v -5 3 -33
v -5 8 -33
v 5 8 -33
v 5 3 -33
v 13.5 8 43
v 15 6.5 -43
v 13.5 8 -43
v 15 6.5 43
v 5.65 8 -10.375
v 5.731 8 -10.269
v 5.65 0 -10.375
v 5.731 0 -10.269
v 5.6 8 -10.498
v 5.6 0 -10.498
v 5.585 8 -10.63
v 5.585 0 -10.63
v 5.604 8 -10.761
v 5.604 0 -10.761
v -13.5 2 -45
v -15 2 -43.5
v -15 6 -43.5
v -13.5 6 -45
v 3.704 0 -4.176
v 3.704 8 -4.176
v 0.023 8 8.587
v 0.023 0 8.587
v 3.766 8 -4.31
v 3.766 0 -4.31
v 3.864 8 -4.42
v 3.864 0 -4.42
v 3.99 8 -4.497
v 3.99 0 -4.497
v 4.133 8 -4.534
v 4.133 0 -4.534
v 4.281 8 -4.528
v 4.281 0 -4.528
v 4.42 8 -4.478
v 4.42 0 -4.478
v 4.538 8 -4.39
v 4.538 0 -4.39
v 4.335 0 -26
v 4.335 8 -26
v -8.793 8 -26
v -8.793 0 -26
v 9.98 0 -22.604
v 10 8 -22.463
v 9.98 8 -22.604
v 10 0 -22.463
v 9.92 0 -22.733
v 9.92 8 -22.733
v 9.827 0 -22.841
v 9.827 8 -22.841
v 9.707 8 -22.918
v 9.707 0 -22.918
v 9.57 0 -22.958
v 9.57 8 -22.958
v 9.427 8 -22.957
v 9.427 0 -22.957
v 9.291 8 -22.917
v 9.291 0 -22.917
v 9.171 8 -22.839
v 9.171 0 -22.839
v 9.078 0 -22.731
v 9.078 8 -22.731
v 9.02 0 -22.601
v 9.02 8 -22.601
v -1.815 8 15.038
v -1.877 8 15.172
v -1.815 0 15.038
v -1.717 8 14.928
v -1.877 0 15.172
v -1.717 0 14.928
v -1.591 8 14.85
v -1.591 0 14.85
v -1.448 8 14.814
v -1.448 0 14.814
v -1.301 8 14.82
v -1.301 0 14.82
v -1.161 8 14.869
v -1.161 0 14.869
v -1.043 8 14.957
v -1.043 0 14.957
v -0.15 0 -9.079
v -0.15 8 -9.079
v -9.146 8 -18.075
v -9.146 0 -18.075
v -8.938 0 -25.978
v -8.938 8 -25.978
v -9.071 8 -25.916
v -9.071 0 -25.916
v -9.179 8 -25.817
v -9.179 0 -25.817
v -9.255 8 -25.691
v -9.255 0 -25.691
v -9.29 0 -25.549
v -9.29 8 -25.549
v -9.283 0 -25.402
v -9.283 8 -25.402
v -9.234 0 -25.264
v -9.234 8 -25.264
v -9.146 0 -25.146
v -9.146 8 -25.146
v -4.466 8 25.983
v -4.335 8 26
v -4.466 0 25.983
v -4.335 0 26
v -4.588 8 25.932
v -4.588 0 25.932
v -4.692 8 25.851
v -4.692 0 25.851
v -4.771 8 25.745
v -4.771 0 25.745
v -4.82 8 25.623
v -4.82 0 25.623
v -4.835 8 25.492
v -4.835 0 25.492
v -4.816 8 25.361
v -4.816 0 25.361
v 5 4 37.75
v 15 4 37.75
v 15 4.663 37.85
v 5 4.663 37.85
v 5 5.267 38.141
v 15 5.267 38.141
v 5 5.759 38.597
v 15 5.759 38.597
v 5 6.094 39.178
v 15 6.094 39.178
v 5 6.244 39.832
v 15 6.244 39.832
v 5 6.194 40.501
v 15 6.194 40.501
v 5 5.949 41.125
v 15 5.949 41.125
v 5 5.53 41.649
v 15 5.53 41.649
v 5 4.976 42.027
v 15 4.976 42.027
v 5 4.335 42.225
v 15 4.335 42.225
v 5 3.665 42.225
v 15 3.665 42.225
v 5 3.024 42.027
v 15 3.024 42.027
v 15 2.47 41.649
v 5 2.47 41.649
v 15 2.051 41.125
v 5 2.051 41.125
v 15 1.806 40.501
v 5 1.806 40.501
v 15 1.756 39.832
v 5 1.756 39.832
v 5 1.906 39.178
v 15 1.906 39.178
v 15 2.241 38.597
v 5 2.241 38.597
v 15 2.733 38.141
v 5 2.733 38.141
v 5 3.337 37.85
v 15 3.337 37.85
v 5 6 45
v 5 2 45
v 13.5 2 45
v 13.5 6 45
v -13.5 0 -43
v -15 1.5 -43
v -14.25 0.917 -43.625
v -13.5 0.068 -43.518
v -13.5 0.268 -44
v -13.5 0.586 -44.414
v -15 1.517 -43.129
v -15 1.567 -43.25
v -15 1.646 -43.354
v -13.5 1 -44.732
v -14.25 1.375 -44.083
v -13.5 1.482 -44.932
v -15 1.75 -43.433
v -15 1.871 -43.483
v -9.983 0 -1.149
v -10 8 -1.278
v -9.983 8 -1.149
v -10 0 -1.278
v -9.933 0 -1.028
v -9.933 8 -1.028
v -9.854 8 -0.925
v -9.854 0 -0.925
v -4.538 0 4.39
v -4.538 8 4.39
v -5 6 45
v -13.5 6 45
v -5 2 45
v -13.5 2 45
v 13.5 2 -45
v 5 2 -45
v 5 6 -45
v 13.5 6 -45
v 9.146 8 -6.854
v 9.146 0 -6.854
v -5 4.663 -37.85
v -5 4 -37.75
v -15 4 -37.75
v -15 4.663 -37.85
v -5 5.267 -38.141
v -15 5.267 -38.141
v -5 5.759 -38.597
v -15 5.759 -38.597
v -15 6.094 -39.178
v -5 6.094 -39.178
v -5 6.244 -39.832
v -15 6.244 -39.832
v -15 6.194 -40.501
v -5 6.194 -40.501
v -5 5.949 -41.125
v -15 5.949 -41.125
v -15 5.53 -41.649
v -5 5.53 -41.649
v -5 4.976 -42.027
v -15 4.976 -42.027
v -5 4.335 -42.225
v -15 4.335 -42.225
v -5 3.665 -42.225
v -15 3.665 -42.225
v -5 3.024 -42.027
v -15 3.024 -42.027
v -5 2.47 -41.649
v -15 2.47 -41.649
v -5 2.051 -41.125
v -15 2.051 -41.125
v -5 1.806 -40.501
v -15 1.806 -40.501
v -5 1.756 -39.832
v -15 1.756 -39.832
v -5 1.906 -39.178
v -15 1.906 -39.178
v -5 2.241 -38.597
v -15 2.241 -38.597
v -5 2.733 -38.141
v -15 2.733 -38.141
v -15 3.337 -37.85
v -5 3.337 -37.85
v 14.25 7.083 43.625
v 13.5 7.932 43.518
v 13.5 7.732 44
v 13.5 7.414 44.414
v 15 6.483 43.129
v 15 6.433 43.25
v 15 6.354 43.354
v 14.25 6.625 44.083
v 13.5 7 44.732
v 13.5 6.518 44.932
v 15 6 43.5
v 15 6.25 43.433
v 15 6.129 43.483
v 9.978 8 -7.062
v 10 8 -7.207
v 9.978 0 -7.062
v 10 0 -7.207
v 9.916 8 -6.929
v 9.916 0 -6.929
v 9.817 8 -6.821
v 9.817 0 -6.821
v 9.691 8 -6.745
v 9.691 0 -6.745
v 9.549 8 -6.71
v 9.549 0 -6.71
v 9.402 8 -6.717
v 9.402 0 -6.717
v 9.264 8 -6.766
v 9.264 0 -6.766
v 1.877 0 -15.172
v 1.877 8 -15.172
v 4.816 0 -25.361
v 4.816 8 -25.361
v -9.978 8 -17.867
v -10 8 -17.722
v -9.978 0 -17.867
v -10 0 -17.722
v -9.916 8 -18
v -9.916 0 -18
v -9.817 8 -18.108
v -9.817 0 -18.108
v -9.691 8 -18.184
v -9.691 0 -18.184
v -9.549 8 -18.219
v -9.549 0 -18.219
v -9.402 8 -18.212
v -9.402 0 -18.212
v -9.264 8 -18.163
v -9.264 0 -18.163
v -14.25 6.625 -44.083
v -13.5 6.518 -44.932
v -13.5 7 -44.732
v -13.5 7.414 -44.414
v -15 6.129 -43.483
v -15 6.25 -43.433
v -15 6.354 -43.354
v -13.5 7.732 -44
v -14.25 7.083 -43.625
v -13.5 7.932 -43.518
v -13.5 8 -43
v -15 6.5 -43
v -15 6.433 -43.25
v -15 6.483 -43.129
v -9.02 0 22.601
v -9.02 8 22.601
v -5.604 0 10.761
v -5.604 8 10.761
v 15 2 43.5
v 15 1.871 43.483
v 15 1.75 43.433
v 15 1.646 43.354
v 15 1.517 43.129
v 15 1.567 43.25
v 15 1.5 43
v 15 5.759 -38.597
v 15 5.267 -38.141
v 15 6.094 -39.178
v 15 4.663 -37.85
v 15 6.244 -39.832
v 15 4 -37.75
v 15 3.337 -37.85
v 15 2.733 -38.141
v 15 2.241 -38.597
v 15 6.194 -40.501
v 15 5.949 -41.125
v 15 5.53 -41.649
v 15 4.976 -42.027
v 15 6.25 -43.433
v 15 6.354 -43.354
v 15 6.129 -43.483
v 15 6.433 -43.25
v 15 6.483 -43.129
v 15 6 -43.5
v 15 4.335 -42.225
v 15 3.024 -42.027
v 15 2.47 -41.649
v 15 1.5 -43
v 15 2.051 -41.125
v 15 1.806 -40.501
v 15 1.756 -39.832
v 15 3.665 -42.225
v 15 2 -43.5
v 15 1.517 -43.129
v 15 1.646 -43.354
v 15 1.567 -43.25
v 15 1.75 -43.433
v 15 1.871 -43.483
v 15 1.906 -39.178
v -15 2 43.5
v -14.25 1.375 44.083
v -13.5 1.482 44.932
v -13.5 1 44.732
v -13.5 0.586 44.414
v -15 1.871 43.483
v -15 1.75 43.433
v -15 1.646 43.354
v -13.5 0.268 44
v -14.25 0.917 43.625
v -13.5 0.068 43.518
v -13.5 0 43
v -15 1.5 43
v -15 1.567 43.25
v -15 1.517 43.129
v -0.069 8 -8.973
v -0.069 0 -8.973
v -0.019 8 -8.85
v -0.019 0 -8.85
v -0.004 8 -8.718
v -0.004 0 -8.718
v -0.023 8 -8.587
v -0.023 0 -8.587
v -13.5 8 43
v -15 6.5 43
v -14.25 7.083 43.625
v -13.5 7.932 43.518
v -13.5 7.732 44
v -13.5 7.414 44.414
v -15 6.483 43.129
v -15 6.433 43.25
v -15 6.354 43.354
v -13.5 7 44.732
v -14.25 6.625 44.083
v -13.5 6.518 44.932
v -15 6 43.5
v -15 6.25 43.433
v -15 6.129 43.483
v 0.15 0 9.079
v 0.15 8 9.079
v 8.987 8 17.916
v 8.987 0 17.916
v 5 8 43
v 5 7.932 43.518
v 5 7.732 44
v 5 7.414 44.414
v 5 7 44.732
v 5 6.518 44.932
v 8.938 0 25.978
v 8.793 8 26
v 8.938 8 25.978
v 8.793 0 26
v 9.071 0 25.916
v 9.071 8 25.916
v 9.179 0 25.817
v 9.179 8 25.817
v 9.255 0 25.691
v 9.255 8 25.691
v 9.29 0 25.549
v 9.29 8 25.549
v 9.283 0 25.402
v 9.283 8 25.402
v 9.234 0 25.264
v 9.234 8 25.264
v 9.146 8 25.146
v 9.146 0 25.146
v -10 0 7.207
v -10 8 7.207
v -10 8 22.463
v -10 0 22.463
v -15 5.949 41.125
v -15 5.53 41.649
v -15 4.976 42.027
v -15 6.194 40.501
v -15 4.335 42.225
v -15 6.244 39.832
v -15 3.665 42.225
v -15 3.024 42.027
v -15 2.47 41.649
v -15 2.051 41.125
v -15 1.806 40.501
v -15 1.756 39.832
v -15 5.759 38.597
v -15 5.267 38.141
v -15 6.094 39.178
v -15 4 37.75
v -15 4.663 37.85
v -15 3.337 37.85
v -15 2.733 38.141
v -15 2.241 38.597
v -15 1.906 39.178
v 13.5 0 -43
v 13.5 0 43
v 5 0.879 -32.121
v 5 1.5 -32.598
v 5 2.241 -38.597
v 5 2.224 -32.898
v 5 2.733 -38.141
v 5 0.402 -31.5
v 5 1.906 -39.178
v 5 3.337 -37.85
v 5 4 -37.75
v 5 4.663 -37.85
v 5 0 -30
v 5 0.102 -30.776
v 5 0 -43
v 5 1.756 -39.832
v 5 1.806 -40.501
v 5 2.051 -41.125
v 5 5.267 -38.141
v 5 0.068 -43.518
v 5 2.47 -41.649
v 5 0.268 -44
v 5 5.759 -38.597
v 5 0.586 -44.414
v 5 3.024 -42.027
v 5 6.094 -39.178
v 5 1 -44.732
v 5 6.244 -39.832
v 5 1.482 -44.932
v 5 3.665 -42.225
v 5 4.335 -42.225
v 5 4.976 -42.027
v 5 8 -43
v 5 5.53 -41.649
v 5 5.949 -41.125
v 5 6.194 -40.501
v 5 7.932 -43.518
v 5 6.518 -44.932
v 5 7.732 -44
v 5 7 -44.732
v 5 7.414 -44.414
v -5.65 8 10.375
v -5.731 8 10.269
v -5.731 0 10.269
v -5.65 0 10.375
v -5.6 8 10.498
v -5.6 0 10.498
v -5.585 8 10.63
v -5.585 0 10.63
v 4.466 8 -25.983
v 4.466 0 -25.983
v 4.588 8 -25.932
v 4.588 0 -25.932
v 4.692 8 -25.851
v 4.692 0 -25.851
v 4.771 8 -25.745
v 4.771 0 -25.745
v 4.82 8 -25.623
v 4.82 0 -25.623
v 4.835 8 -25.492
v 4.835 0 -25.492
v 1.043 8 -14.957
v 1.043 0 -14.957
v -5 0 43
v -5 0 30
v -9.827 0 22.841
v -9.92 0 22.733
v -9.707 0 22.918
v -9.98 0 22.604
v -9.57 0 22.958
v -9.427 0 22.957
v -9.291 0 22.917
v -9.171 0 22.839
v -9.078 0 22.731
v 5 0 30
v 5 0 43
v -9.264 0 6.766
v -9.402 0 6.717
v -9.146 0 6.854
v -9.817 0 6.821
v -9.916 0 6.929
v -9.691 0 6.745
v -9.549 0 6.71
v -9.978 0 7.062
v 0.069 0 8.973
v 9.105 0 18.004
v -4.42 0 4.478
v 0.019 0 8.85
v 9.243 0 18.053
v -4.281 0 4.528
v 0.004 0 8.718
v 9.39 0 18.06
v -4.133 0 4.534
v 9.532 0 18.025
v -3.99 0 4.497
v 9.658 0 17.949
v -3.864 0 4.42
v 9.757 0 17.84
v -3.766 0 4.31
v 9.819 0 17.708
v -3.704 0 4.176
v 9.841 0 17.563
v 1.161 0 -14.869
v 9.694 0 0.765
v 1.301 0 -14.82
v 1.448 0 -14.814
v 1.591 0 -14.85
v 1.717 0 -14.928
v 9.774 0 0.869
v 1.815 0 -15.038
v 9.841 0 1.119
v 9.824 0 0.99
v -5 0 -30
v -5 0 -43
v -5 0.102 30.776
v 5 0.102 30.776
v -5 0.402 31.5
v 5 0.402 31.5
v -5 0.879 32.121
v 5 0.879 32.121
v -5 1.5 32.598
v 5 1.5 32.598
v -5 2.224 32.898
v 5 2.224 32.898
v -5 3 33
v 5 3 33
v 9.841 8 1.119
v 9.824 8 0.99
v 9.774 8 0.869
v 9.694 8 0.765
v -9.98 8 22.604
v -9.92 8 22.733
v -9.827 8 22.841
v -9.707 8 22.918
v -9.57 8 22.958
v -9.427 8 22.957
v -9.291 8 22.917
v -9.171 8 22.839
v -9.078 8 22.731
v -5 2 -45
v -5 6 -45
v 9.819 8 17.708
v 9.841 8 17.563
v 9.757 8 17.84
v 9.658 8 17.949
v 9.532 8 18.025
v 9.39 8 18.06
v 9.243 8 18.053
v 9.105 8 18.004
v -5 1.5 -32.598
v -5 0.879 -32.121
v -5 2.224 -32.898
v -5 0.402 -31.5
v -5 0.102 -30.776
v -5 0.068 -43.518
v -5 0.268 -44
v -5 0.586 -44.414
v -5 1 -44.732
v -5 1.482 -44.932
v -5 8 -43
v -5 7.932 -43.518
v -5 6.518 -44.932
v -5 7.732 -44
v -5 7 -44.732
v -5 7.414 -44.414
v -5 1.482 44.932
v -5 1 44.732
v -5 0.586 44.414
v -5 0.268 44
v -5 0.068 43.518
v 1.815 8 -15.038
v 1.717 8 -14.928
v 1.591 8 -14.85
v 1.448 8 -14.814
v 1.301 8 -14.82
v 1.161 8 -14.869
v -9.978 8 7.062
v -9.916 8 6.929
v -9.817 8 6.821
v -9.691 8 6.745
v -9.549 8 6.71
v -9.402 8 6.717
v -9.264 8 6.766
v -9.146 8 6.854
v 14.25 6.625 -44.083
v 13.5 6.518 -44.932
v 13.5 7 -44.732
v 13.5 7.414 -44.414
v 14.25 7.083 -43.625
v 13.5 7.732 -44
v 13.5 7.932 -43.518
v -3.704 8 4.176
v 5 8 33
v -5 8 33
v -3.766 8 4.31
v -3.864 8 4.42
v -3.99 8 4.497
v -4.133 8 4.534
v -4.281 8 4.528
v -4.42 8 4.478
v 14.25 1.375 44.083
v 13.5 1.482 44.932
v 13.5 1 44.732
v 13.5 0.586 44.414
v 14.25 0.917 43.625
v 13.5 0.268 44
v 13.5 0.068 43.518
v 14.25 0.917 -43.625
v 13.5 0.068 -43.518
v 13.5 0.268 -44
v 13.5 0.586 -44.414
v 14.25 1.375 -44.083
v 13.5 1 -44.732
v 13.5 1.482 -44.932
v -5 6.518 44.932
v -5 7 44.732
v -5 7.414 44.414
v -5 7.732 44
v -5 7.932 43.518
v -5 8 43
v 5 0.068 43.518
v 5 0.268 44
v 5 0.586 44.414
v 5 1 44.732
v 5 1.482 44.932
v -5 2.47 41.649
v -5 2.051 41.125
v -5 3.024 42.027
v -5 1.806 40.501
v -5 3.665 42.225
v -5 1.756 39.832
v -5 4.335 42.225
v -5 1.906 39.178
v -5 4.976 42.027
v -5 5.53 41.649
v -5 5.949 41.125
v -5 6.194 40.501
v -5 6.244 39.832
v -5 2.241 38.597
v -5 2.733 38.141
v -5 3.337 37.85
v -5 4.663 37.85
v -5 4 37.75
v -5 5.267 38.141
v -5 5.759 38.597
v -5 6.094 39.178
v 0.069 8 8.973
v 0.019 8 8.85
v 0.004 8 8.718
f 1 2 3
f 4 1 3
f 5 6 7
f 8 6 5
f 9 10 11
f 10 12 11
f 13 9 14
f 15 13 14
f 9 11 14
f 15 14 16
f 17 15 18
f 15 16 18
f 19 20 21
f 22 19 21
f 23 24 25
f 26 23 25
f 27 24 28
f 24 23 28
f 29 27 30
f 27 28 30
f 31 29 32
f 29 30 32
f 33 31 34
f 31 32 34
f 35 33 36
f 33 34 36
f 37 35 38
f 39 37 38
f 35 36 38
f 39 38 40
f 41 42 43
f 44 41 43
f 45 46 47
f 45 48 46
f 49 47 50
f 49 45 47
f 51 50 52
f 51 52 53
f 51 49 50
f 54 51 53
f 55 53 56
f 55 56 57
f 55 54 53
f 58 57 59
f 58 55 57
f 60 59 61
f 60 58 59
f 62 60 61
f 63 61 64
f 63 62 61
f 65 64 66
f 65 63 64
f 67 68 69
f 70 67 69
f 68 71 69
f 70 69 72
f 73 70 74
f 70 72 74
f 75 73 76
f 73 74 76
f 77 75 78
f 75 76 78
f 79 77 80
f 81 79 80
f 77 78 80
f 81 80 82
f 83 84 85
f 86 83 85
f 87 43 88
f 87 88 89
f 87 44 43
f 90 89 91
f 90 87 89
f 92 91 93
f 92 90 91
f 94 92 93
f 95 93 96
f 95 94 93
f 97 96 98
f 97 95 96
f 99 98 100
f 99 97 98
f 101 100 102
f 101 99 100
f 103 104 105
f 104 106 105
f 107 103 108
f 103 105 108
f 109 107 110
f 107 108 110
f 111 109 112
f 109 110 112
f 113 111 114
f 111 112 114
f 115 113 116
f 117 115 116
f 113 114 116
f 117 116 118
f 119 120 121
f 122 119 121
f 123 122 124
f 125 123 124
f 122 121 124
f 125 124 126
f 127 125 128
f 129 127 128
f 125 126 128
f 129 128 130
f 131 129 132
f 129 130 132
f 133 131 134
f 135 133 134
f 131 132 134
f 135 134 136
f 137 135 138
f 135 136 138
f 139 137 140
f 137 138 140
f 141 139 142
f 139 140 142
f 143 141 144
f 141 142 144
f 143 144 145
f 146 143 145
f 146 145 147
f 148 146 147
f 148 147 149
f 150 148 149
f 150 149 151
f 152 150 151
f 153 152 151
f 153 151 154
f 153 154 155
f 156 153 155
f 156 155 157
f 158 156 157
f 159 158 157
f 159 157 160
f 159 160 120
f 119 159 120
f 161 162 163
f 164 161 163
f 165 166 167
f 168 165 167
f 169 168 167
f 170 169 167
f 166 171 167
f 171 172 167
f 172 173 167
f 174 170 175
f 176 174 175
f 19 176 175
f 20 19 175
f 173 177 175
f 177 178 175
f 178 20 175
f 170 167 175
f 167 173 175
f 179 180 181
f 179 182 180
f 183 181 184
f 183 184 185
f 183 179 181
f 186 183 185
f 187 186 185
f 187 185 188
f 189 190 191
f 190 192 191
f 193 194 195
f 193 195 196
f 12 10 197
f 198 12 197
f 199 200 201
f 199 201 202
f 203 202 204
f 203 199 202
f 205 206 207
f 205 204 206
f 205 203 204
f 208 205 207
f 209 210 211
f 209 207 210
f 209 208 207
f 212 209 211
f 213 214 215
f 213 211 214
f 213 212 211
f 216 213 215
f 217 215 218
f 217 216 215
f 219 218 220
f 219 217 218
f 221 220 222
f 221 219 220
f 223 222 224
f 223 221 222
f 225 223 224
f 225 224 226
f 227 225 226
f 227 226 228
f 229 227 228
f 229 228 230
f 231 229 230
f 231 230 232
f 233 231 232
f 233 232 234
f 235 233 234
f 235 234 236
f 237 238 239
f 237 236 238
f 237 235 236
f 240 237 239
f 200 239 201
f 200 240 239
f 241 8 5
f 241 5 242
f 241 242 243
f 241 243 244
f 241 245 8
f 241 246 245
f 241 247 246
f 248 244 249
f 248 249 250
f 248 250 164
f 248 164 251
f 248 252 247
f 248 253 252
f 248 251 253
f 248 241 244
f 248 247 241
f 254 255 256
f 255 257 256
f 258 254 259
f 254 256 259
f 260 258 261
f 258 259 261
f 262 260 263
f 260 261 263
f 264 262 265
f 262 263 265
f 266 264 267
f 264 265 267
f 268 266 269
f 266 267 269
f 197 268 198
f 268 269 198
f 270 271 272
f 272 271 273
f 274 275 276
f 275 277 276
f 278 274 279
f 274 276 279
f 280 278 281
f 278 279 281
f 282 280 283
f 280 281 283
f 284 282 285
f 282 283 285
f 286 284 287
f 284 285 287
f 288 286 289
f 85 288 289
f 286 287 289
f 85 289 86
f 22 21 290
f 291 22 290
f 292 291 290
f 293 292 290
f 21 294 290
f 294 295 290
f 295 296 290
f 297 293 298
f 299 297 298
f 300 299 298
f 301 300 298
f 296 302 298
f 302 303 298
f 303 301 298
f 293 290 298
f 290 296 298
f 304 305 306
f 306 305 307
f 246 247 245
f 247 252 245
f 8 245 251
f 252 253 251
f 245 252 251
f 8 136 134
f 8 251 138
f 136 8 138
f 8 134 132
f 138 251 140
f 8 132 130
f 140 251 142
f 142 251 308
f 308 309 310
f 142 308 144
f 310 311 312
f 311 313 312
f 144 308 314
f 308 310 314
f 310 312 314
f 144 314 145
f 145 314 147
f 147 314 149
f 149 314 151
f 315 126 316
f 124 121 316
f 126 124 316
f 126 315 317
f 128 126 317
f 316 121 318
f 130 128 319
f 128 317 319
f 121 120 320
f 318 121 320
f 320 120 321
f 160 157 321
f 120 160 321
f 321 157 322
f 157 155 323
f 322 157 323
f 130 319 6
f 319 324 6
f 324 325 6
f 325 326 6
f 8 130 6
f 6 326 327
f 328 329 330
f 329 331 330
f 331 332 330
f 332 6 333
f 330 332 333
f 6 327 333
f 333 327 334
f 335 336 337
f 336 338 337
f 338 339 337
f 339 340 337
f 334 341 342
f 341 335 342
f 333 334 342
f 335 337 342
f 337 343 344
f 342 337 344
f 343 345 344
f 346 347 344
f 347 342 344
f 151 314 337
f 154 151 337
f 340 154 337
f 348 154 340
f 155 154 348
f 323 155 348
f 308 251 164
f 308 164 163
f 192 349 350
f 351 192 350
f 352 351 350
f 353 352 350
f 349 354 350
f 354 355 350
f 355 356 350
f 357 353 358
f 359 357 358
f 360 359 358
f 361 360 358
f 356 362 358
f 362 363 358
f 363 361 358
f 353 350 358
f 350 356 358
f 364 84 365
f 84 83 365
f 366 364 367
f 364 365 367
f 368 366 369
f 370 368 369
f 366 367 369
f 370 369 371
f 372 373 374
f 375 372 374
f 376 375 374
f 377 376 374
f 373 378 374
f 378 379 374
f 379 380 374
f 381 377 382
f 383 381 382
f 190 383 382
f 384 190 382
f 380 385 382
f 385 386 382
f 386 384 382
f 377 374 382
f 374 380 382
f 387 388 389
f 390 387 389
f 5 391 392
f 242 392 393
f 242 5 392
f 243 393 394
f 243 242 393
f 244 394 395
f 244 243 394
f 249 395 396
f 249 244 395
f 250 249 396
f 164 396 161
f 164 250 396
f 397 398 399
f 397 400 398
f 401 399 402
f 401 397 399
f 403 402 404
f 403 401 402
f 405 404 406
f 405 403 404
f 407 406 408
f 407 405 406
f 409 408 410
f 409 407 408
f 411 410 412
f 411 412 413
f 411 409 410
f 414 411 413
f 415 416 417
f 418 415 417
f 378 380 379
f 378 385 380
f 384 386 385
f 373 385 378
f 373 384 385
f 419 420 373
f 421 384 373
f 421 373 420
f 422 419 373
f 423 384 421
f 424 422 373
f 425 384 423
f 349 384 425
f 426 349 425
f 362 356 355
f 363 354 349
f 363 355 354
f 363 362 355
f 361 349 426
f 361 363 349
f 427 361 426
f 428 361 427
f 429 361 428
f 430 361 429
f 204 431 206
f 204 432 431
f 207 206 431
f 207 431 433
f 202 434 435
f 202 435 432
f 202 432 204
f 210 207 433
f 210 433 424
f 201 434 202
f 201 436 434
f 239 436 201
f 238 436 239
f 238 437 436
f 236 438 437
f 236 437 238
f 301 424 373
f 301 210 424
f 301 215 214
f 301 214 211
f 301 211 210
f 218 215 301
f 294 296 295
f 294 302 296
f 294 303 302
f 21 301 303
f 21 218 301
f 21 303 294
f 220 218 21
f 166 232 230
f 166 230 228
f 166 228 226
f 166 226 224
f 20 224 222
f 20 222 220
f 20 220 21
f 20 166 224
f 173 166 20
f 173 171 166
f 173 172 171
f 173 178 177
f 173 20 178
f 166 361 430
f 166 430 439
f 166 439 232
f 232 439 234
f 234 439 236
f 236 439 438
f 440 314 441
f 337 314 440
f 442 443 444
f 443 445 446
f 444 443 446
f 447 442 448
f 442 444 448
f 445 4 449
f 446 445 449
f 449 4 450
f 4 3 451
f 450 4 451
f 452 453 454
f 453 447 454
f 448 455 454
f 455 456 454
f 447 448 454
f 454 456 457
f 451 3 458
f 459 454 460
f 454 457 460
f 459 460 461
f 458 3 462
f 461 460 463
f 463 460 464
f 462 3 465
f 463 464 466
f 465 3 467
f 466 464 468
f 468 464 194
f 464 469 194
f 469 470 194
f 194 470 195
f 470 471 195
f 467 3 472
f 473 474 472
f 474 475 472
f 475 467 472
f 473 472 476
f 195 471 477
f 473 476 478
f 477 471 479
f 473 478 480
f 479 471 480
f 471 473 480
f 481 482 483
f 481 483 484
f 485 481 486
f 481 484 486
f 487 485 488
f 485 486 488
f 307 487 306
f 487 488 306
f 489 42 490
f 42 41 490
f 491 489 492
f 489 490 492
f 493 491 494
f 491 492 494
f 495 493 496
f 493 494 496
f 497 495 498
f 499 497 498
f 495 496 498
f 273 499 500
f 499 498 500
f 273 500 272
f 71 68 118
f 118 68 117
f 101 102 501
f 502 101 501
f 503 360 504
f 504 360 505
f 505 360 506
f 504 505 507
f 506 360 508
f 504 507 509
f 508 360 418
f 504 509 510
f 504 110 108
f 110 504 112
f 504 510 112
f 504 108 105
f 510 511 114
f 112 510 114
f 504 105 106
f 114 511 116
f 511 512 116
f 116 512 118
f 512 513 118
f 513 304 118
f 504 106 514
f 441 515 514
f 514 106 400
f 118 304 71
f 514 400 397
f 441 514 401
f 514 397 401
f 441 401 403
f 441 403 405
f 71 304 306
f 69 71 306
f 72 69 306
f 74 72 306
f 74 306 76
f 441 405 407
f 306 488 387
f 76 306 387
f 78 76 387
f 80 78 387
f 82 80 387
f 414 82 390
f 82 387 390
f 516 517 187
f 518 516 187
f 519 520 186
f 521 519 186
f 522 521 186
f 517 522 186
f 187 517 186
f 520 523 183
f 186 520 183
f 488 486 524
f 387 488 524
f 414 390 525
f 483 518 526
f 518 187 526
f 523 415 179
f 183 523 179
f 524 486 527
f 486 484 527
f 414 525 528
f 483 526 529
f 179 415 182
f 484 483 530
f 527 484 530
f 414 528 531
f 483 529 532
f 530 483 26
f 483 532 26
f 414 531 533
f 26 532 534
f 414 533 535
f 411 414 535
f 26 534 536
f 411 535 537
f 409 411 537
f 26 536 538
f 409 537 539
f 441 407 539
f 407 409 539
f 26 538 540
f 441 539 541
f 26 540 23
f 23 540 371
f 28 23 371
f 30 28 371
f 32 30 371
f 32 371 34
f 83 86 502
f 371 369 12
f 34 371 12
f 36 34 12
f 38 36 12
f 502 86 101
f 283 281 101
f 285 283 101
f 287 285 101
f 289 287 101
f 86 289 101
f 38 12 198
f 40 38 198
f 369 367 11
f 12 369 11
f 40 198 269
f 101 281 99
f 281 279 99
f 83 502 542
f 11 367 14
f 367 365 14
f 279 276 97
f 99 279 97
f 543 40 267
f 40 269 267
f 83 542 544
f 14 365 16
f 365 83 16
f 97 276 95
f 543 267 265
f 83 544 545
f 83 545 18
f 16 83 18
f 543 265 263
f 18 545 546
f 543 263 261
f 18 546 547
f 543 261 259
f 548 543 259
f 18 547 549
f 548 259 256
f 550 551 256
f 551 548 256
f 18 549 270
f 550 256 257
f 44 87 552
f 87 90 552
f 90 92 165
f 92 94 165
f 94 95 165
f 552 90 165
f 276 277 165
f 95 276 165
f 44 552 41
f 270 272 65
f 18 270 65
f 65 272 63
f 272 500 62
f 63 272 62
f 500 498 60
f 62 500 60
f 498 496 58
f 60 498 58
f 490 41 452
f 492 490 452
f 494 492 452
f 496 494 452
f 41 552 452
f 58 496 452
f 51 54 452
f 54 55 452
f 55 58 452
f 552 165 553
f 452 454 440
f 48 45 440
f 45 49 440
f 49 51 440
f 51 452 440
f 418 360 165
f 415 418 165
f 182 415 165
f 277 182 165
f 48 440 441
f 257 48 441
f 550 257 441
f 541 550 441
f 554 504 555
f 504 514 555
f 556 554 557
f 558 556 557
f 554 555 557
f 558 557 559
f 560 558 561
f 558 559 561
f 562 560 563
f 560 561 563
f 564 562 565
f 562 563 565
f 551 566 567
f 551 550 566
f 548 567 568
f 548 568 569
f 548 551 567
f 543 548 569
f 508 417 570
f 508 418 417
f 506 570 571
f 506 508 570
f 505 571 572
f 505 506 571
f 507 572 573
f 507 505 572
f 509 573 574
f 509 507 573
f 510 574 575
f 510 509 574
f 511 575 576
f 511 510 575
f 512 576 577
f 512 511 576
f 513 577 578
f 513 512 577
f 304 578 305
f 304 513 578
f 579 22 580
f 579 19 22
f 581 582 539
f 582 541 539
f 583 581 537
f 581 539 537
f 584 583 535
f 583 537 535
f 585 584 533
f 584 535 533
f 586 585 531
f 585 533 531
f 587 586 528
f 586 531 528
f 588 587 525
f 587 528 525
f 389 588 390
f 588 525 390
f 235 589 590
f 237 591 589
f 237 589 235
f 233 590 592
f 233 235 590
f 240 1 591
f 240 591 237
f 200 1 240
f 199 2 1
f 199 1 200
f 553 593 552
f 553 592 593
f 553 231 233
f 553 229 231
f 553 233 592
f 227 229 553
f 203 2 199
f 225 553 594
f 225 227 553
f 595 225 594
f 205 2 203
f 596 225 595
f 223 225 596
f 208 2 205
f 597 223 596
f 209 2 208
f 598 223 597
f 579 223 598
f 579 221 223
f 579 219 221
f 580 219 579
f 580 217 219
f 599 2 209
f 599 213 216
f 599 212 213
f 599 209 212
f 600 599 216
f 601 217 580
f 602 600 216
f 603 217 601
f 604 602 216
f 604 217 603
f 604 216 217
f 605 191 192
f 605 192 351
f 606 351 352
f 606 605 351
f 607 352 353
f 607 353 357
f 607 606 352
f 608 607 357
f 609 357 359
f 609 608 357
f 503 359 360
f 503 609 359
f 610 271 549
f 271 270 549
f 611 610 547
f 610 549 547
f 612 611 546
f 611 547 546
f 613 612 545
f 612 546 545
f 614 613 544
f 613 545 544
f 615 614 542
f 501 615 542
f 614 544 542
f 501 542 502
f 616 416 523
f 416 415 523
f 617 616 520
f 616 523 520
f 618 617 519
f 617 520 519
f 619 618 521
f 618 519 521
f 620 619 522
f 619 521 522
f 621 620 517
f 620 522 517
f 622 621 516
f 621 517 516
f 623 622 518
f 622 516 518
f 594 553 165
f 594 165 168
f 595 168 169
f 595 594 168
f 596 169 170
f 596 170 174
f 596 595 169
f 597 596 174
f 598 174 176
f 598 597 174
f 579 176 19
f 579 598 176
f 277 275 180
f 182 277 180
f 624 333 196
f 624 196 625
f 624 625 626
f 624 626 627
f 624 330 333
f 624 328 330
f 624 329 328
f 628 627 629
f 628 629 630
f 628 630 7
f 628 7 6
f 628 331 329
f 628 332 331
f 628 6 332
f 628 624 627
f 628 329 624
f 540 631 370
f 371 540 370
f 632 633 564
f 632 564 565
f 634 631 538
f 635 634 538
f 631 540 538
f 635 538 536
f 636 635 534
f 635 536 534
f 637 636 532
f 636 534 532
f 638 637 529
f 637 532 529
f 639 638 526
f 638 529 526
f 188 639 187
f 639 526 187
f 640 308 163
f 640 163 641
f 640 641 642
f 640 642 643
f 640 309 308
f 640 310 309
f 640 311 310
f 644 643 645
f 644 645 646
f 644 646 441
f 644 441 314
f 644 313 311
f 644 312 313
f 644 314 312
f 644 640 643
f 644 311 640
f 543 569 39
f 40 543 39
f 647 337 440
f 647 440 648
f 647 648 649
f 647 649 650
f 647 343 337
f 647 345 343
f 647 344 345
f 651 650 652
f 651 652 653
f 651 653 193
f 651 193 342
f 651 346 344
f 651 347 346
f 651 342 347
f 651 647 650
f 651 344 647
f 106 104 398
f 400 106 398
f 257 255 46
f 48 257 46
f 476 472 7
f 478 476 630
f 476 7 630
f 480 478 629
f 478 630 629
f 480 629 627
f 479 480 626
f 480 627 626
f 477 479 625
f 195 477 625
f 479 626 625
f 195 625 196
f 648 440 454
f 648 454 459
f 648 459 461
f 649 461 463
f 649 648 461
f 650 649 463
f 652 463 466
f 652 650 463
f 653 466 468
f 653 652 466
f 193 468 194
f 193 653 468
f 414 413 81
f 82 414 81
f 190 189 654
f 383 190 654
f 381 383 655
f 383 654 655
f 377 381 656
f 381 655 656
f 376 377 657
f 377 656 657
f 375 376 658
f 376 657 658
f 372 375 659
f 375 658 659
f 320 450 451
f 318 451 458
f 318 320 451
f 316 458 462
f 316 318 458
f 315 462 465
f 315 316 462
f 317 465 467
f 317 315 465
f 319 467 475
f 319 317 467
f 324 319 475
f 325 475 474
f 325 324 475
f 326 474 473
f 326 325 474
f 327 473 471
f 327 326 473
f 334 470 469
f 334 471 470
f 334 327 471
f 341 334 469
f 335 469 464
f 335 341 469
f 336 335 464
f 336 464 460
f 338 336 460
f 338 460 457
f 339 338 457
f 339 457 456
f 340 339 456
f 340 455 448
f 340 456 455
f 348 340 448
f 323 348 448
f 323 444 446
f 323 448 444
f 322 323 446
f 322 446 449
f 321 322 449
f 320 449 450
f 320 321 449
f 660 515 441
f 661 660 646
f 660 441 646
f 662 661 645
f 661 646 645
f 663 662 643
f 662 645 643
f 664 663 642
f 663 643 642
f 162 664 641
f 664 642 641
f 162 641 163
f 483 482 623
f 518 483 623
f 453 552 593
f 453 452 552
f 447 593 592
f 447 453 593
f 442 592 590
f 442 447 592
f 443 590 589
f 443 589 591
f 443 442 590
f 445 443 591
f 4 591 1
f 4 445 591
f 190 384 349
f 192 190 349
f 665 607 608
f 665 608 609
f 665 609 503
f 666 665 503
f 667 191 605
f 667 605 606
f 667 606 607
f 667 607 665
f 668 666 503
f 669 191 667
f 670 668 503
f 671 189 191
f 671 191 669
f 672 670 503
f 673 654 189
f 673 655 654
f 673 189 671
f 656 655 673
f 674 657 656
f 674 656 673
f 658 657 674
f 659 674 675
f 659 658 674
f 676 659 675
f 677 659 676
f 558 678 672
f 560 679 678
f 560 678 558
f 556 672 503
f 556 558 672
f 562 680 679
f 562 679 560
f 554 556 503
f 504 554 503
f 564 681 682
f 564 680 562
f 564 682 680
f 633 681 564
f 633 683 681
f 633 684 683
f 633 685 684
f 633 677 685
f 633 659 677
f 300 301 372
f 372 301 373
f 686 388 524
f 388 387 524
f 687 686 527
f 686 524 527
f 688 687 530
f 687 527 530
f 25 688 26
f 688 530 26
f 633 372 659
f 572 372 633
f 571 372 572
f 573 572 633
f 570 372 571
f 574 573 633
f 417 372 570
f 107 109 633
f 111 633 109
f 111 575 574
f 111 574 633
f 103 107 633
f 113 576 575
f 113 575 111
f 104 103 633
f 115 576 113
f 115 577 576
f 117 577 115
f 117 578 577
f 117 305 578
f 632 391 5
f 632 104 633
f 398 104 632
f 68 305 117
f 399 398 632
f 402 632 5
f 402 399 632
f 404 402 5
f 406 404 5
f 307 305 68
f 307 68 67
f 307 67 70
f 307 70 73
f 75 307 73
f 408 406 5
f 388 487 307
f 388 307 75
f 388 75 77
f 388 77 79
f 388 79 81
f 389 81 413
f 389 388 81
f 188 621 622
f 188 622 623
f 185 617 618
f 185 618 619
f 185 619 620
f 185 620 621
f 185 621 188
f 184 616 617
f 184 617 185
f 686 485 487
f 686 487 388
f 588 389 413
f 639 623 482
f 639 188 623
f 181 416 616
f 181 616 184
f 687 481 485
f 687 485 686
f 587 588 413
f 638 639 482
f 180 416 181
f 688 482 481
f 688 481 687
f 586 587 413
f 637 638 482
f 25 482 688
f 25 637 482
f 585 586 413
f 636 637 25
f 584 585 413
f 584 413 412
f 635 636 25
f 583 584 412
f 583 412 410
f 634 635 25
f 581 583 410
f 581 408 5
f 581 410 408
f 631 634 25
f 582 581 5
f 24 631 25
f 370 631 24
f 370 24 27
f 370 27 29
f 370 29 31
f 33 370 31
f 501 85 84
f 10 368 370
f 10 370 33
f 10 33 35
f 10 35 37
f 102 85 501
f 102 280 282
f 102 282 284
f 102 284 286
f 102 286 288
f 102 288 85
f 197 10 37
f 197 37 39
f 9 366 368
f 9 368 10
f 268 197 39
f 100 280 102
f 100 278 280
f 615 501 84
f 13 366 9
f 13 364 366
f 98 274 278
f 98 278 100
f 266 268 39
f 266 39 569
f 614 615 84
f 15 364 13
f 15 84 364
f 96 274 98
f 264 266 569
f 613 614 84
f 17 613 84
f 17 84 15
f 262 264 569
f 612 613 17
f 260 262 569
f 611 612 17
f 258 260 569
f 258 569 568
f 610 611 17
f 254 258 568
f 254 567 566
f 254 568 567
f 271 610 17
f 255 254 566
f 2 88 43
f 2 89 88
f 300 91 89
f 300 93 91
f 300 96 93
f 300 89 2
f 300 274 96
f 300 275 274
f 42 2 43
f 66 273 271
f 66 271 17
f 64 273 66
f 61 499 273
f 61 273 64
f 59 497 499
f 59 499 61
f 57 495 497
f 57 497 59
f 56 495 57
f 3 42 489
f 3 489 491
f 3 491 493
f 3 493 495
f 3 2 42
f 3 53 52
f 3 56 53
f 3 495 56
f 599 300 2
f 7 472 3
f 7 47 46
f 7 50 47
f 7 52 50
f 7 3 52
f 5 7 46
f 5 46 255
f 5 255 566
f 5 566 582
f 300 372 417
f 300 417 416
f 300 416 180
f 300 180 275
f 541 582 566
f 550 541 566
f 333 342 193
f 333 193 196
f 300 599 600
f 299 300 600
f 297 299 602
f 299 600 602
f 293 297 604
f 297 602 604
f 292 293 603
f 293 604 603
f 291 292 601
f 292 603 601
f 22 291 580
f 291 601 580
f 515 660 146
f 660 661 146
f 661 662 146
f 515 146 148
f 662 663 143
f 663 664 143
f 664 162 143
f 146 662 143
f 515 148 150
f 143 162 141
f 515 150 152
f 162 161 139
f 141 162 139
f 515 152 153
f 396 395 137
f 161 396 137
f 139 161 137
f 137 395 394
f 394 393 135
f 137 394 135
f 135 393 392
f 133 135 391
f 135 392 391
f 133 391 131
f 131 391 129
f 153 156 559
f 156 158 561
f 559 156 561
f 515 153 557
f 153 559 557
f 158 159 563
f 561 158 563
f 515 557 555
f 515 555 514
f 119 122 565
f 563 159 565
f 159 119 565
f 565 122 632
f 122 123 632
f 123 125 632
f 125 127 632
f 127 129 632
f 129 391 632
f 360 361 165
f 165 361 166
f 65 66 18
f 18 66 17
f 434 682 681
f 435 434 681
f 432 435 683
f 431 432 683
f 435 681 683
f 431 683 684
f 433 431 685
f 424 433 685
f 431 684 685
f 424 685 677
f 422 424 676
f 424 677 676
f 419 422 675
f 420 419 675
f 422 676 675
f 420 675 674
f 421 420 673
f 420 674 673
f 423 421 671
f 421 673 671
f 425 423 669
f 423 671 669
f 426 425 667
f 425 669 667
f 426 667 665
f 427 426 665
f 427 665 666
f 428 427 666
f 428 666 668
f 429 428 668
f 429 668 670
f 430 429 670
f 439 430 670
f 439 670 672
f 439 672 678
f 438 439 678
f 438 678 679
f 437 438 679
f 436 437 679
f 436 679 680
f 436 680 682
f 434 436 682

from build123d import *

# Parameters (mm, degrees)
SKETCH1_W           = 30
SKETCH1_H           = 90
BOSS_EXTRUDE1_DEPTH = 8
SKETCH2_W           = 10
SKETCH2_H           = 12
CUT_EXTRUDE1_DEPTH  = 8
SKETCH3_R           = 2.25
CUT_EXTRUDE2_DEPTH  = 55.671747731
FILLET1_R           = 2
CUT_EXTRUDE3_DEPTH  = 49.104053883
FILLET2_R           = 3
CHAMFER1_SIZE       = 1.5
FILLET3_R           = 0.5


with BuildPart() as part:
    # Sketch1 → Boss-Extrude1 (new body)
    with BuildSketch(Plane(origin=(0, 0, 0), x_dir=(1, 0, 0), z_dir=(0, 1, 0))):
        Rectangle(SKETCH1_W, SKETCH1_H)
    extrude(amount=BOSS_EXTRUDE1_DEPTH)

    # Sketch2 → Cut-Extrude1 (cut)
    with BuildSketch(Plane(origin=(0, 8, 0), x_dir=(1, 0, 0), z_dir=(0, 1, 0))):
        with Locations((0, 39)):
            Rectangle(SKETCH2_W, SKETCH2_H)
        with Locations((0, -39)):
            Rectangle(SKETCH2_W, SKETCH2_H)
    extrude(amount=-CUT_EXTRUDE1_DEPTH, mode=Mode.SUBTRACT)

    # Sketch3 → Cut-Extrude2 (cut, through all)
    with BuildSketch(Plane(origin=(15, 0, 0), x_dir=(0, 0, -1), z_dir=(1, 0, 0))):
        with Locations((-40, 4)):
            Circle(SKETCH3_R)
    cut_extrude2 = extrude(amount=-CUT_EXTRUDE2_DEPTH, mode=Mode.SUBTRACT)

    # Mirror1: Cut-Extrude2 across plane
    add(cut_extrude2.mirror(Plane.XY), mode=Mode.SUBTRACT)

    # Fillet1
    fillet1_edges = [part.edges().sort_by_distance(p)[0] for p in [
        (10, 0, 45),
        (-10, 0, -45),
        (-10, 8, 45),
        (-10, 8, -45),
        (10, 8, 45),
        (-10, 0, 45),
        (10, 0, -45),
        (10, 8, -45),
    ]]
    fillet(fillet1_edges, radius=FILLET1_R)

    # Sketch4 → Cut-Extrude3 (cut, through all)
    with BuildSketch(Plane(origin=(0, 8, 0), x_dir=(1, 0, 0), z_dir=(0, 1, 0))):
        Polygon((5, 26), (-10, 26), (1.641791045, 14.358208955), align=None)
        Polygon((10, 6), (10, 26), (5.52238806, 10.47761194), align=None)
        Polygon((-10, -6), (-10, -26), (-5.52238806, -10.47761194), align=None)
        Polygon((-5, -26), (10, -26), (-1.641791045, -14.358208955), align=None)
        Polygon((-10, 18.928932188), (-10, 1.071067812), (-3.939313176, -4.989619012), (0.058716162, 8.870216027), align=None)
        Polygon((9.840778775, -18.769710963), (9.840778775, -0.911846587), (3.939313176, 4.989619012), (-0.058716162, -8.870216027), align=None)
    extrude(amount=-CUT_EXTRUDE3_DEPTH, mode=Mode.SUBTRACT)

    # Fillet2
    fillet2_edges = [part.edges().sort_by_distance(p)[0] for p in [
        (0, 0, -33),
        (0, 0, 33),
    ]]
    fillet(fillet2_edges, radius=FILLET2_R)

    # Chamfer1
    chamfer1_edges = [part.edges().sort_by_distance(p)[0] for p in [
        (15, 4, -45),
        (15, 0, 0),
        (-15, 0, 0),
        (15, 8, 0),
        (15, 4, 45),
        (15, 7.414213562, 44.414213562),
        (15, 0.585786438, 44.414213562),
        (15, 7.414213562, -44.414213562),
        (15, 0.585786438, -44.414213562),
        (-15, 8, 0),
        (-15, 4, 45),
        (-15, 4, -45),
        (-15, 0.585786438, 44.414213562),
        (-15, 7.414213562, 44.414213562),
        (-15, 0.585786438, -44.414213562),
        (-15, 7.414213562, -44.414213562),
    ]]
    chamfer(chamfer1_edges, length=CHAMFER1_SIZE)

    # Fillet3
    fillet3_edges = [part.edges().sort_by_distance(p)[0] for p in [
        (-10, 4, -18.928932188),
        (0.058716162, 4, -8.870216027),
        (-3.939313176, 4, 4.989619012),
        (-10, 4, -1.071067812),
        (-1.641791045, 4, 14.358208955),
        (10, 4, 26),
        (-5, 4, 26),
        (10, 4, -6),
        (5.52238806, 4, -10.47761194),
        (10, 4, -26),
        (-10, 4, 6),
        (-5.52238806, 4, 10.47761194),
        (-10, 4, 26),
        (9.840778775, 4, 18.769710963),
        (-0.058716162, 4, 8.870216027),
        (3.939313176, 4, -4.989619012),
        (9.840778775, 4, 0.911846587),
        (5, 4, -26),
        (1.641791045, 4, -14.358208955),
        (-10, 4, -26),
    ]]
    fillet(fillet3_edges, radius=FILLET3_R)


solid = part.part
